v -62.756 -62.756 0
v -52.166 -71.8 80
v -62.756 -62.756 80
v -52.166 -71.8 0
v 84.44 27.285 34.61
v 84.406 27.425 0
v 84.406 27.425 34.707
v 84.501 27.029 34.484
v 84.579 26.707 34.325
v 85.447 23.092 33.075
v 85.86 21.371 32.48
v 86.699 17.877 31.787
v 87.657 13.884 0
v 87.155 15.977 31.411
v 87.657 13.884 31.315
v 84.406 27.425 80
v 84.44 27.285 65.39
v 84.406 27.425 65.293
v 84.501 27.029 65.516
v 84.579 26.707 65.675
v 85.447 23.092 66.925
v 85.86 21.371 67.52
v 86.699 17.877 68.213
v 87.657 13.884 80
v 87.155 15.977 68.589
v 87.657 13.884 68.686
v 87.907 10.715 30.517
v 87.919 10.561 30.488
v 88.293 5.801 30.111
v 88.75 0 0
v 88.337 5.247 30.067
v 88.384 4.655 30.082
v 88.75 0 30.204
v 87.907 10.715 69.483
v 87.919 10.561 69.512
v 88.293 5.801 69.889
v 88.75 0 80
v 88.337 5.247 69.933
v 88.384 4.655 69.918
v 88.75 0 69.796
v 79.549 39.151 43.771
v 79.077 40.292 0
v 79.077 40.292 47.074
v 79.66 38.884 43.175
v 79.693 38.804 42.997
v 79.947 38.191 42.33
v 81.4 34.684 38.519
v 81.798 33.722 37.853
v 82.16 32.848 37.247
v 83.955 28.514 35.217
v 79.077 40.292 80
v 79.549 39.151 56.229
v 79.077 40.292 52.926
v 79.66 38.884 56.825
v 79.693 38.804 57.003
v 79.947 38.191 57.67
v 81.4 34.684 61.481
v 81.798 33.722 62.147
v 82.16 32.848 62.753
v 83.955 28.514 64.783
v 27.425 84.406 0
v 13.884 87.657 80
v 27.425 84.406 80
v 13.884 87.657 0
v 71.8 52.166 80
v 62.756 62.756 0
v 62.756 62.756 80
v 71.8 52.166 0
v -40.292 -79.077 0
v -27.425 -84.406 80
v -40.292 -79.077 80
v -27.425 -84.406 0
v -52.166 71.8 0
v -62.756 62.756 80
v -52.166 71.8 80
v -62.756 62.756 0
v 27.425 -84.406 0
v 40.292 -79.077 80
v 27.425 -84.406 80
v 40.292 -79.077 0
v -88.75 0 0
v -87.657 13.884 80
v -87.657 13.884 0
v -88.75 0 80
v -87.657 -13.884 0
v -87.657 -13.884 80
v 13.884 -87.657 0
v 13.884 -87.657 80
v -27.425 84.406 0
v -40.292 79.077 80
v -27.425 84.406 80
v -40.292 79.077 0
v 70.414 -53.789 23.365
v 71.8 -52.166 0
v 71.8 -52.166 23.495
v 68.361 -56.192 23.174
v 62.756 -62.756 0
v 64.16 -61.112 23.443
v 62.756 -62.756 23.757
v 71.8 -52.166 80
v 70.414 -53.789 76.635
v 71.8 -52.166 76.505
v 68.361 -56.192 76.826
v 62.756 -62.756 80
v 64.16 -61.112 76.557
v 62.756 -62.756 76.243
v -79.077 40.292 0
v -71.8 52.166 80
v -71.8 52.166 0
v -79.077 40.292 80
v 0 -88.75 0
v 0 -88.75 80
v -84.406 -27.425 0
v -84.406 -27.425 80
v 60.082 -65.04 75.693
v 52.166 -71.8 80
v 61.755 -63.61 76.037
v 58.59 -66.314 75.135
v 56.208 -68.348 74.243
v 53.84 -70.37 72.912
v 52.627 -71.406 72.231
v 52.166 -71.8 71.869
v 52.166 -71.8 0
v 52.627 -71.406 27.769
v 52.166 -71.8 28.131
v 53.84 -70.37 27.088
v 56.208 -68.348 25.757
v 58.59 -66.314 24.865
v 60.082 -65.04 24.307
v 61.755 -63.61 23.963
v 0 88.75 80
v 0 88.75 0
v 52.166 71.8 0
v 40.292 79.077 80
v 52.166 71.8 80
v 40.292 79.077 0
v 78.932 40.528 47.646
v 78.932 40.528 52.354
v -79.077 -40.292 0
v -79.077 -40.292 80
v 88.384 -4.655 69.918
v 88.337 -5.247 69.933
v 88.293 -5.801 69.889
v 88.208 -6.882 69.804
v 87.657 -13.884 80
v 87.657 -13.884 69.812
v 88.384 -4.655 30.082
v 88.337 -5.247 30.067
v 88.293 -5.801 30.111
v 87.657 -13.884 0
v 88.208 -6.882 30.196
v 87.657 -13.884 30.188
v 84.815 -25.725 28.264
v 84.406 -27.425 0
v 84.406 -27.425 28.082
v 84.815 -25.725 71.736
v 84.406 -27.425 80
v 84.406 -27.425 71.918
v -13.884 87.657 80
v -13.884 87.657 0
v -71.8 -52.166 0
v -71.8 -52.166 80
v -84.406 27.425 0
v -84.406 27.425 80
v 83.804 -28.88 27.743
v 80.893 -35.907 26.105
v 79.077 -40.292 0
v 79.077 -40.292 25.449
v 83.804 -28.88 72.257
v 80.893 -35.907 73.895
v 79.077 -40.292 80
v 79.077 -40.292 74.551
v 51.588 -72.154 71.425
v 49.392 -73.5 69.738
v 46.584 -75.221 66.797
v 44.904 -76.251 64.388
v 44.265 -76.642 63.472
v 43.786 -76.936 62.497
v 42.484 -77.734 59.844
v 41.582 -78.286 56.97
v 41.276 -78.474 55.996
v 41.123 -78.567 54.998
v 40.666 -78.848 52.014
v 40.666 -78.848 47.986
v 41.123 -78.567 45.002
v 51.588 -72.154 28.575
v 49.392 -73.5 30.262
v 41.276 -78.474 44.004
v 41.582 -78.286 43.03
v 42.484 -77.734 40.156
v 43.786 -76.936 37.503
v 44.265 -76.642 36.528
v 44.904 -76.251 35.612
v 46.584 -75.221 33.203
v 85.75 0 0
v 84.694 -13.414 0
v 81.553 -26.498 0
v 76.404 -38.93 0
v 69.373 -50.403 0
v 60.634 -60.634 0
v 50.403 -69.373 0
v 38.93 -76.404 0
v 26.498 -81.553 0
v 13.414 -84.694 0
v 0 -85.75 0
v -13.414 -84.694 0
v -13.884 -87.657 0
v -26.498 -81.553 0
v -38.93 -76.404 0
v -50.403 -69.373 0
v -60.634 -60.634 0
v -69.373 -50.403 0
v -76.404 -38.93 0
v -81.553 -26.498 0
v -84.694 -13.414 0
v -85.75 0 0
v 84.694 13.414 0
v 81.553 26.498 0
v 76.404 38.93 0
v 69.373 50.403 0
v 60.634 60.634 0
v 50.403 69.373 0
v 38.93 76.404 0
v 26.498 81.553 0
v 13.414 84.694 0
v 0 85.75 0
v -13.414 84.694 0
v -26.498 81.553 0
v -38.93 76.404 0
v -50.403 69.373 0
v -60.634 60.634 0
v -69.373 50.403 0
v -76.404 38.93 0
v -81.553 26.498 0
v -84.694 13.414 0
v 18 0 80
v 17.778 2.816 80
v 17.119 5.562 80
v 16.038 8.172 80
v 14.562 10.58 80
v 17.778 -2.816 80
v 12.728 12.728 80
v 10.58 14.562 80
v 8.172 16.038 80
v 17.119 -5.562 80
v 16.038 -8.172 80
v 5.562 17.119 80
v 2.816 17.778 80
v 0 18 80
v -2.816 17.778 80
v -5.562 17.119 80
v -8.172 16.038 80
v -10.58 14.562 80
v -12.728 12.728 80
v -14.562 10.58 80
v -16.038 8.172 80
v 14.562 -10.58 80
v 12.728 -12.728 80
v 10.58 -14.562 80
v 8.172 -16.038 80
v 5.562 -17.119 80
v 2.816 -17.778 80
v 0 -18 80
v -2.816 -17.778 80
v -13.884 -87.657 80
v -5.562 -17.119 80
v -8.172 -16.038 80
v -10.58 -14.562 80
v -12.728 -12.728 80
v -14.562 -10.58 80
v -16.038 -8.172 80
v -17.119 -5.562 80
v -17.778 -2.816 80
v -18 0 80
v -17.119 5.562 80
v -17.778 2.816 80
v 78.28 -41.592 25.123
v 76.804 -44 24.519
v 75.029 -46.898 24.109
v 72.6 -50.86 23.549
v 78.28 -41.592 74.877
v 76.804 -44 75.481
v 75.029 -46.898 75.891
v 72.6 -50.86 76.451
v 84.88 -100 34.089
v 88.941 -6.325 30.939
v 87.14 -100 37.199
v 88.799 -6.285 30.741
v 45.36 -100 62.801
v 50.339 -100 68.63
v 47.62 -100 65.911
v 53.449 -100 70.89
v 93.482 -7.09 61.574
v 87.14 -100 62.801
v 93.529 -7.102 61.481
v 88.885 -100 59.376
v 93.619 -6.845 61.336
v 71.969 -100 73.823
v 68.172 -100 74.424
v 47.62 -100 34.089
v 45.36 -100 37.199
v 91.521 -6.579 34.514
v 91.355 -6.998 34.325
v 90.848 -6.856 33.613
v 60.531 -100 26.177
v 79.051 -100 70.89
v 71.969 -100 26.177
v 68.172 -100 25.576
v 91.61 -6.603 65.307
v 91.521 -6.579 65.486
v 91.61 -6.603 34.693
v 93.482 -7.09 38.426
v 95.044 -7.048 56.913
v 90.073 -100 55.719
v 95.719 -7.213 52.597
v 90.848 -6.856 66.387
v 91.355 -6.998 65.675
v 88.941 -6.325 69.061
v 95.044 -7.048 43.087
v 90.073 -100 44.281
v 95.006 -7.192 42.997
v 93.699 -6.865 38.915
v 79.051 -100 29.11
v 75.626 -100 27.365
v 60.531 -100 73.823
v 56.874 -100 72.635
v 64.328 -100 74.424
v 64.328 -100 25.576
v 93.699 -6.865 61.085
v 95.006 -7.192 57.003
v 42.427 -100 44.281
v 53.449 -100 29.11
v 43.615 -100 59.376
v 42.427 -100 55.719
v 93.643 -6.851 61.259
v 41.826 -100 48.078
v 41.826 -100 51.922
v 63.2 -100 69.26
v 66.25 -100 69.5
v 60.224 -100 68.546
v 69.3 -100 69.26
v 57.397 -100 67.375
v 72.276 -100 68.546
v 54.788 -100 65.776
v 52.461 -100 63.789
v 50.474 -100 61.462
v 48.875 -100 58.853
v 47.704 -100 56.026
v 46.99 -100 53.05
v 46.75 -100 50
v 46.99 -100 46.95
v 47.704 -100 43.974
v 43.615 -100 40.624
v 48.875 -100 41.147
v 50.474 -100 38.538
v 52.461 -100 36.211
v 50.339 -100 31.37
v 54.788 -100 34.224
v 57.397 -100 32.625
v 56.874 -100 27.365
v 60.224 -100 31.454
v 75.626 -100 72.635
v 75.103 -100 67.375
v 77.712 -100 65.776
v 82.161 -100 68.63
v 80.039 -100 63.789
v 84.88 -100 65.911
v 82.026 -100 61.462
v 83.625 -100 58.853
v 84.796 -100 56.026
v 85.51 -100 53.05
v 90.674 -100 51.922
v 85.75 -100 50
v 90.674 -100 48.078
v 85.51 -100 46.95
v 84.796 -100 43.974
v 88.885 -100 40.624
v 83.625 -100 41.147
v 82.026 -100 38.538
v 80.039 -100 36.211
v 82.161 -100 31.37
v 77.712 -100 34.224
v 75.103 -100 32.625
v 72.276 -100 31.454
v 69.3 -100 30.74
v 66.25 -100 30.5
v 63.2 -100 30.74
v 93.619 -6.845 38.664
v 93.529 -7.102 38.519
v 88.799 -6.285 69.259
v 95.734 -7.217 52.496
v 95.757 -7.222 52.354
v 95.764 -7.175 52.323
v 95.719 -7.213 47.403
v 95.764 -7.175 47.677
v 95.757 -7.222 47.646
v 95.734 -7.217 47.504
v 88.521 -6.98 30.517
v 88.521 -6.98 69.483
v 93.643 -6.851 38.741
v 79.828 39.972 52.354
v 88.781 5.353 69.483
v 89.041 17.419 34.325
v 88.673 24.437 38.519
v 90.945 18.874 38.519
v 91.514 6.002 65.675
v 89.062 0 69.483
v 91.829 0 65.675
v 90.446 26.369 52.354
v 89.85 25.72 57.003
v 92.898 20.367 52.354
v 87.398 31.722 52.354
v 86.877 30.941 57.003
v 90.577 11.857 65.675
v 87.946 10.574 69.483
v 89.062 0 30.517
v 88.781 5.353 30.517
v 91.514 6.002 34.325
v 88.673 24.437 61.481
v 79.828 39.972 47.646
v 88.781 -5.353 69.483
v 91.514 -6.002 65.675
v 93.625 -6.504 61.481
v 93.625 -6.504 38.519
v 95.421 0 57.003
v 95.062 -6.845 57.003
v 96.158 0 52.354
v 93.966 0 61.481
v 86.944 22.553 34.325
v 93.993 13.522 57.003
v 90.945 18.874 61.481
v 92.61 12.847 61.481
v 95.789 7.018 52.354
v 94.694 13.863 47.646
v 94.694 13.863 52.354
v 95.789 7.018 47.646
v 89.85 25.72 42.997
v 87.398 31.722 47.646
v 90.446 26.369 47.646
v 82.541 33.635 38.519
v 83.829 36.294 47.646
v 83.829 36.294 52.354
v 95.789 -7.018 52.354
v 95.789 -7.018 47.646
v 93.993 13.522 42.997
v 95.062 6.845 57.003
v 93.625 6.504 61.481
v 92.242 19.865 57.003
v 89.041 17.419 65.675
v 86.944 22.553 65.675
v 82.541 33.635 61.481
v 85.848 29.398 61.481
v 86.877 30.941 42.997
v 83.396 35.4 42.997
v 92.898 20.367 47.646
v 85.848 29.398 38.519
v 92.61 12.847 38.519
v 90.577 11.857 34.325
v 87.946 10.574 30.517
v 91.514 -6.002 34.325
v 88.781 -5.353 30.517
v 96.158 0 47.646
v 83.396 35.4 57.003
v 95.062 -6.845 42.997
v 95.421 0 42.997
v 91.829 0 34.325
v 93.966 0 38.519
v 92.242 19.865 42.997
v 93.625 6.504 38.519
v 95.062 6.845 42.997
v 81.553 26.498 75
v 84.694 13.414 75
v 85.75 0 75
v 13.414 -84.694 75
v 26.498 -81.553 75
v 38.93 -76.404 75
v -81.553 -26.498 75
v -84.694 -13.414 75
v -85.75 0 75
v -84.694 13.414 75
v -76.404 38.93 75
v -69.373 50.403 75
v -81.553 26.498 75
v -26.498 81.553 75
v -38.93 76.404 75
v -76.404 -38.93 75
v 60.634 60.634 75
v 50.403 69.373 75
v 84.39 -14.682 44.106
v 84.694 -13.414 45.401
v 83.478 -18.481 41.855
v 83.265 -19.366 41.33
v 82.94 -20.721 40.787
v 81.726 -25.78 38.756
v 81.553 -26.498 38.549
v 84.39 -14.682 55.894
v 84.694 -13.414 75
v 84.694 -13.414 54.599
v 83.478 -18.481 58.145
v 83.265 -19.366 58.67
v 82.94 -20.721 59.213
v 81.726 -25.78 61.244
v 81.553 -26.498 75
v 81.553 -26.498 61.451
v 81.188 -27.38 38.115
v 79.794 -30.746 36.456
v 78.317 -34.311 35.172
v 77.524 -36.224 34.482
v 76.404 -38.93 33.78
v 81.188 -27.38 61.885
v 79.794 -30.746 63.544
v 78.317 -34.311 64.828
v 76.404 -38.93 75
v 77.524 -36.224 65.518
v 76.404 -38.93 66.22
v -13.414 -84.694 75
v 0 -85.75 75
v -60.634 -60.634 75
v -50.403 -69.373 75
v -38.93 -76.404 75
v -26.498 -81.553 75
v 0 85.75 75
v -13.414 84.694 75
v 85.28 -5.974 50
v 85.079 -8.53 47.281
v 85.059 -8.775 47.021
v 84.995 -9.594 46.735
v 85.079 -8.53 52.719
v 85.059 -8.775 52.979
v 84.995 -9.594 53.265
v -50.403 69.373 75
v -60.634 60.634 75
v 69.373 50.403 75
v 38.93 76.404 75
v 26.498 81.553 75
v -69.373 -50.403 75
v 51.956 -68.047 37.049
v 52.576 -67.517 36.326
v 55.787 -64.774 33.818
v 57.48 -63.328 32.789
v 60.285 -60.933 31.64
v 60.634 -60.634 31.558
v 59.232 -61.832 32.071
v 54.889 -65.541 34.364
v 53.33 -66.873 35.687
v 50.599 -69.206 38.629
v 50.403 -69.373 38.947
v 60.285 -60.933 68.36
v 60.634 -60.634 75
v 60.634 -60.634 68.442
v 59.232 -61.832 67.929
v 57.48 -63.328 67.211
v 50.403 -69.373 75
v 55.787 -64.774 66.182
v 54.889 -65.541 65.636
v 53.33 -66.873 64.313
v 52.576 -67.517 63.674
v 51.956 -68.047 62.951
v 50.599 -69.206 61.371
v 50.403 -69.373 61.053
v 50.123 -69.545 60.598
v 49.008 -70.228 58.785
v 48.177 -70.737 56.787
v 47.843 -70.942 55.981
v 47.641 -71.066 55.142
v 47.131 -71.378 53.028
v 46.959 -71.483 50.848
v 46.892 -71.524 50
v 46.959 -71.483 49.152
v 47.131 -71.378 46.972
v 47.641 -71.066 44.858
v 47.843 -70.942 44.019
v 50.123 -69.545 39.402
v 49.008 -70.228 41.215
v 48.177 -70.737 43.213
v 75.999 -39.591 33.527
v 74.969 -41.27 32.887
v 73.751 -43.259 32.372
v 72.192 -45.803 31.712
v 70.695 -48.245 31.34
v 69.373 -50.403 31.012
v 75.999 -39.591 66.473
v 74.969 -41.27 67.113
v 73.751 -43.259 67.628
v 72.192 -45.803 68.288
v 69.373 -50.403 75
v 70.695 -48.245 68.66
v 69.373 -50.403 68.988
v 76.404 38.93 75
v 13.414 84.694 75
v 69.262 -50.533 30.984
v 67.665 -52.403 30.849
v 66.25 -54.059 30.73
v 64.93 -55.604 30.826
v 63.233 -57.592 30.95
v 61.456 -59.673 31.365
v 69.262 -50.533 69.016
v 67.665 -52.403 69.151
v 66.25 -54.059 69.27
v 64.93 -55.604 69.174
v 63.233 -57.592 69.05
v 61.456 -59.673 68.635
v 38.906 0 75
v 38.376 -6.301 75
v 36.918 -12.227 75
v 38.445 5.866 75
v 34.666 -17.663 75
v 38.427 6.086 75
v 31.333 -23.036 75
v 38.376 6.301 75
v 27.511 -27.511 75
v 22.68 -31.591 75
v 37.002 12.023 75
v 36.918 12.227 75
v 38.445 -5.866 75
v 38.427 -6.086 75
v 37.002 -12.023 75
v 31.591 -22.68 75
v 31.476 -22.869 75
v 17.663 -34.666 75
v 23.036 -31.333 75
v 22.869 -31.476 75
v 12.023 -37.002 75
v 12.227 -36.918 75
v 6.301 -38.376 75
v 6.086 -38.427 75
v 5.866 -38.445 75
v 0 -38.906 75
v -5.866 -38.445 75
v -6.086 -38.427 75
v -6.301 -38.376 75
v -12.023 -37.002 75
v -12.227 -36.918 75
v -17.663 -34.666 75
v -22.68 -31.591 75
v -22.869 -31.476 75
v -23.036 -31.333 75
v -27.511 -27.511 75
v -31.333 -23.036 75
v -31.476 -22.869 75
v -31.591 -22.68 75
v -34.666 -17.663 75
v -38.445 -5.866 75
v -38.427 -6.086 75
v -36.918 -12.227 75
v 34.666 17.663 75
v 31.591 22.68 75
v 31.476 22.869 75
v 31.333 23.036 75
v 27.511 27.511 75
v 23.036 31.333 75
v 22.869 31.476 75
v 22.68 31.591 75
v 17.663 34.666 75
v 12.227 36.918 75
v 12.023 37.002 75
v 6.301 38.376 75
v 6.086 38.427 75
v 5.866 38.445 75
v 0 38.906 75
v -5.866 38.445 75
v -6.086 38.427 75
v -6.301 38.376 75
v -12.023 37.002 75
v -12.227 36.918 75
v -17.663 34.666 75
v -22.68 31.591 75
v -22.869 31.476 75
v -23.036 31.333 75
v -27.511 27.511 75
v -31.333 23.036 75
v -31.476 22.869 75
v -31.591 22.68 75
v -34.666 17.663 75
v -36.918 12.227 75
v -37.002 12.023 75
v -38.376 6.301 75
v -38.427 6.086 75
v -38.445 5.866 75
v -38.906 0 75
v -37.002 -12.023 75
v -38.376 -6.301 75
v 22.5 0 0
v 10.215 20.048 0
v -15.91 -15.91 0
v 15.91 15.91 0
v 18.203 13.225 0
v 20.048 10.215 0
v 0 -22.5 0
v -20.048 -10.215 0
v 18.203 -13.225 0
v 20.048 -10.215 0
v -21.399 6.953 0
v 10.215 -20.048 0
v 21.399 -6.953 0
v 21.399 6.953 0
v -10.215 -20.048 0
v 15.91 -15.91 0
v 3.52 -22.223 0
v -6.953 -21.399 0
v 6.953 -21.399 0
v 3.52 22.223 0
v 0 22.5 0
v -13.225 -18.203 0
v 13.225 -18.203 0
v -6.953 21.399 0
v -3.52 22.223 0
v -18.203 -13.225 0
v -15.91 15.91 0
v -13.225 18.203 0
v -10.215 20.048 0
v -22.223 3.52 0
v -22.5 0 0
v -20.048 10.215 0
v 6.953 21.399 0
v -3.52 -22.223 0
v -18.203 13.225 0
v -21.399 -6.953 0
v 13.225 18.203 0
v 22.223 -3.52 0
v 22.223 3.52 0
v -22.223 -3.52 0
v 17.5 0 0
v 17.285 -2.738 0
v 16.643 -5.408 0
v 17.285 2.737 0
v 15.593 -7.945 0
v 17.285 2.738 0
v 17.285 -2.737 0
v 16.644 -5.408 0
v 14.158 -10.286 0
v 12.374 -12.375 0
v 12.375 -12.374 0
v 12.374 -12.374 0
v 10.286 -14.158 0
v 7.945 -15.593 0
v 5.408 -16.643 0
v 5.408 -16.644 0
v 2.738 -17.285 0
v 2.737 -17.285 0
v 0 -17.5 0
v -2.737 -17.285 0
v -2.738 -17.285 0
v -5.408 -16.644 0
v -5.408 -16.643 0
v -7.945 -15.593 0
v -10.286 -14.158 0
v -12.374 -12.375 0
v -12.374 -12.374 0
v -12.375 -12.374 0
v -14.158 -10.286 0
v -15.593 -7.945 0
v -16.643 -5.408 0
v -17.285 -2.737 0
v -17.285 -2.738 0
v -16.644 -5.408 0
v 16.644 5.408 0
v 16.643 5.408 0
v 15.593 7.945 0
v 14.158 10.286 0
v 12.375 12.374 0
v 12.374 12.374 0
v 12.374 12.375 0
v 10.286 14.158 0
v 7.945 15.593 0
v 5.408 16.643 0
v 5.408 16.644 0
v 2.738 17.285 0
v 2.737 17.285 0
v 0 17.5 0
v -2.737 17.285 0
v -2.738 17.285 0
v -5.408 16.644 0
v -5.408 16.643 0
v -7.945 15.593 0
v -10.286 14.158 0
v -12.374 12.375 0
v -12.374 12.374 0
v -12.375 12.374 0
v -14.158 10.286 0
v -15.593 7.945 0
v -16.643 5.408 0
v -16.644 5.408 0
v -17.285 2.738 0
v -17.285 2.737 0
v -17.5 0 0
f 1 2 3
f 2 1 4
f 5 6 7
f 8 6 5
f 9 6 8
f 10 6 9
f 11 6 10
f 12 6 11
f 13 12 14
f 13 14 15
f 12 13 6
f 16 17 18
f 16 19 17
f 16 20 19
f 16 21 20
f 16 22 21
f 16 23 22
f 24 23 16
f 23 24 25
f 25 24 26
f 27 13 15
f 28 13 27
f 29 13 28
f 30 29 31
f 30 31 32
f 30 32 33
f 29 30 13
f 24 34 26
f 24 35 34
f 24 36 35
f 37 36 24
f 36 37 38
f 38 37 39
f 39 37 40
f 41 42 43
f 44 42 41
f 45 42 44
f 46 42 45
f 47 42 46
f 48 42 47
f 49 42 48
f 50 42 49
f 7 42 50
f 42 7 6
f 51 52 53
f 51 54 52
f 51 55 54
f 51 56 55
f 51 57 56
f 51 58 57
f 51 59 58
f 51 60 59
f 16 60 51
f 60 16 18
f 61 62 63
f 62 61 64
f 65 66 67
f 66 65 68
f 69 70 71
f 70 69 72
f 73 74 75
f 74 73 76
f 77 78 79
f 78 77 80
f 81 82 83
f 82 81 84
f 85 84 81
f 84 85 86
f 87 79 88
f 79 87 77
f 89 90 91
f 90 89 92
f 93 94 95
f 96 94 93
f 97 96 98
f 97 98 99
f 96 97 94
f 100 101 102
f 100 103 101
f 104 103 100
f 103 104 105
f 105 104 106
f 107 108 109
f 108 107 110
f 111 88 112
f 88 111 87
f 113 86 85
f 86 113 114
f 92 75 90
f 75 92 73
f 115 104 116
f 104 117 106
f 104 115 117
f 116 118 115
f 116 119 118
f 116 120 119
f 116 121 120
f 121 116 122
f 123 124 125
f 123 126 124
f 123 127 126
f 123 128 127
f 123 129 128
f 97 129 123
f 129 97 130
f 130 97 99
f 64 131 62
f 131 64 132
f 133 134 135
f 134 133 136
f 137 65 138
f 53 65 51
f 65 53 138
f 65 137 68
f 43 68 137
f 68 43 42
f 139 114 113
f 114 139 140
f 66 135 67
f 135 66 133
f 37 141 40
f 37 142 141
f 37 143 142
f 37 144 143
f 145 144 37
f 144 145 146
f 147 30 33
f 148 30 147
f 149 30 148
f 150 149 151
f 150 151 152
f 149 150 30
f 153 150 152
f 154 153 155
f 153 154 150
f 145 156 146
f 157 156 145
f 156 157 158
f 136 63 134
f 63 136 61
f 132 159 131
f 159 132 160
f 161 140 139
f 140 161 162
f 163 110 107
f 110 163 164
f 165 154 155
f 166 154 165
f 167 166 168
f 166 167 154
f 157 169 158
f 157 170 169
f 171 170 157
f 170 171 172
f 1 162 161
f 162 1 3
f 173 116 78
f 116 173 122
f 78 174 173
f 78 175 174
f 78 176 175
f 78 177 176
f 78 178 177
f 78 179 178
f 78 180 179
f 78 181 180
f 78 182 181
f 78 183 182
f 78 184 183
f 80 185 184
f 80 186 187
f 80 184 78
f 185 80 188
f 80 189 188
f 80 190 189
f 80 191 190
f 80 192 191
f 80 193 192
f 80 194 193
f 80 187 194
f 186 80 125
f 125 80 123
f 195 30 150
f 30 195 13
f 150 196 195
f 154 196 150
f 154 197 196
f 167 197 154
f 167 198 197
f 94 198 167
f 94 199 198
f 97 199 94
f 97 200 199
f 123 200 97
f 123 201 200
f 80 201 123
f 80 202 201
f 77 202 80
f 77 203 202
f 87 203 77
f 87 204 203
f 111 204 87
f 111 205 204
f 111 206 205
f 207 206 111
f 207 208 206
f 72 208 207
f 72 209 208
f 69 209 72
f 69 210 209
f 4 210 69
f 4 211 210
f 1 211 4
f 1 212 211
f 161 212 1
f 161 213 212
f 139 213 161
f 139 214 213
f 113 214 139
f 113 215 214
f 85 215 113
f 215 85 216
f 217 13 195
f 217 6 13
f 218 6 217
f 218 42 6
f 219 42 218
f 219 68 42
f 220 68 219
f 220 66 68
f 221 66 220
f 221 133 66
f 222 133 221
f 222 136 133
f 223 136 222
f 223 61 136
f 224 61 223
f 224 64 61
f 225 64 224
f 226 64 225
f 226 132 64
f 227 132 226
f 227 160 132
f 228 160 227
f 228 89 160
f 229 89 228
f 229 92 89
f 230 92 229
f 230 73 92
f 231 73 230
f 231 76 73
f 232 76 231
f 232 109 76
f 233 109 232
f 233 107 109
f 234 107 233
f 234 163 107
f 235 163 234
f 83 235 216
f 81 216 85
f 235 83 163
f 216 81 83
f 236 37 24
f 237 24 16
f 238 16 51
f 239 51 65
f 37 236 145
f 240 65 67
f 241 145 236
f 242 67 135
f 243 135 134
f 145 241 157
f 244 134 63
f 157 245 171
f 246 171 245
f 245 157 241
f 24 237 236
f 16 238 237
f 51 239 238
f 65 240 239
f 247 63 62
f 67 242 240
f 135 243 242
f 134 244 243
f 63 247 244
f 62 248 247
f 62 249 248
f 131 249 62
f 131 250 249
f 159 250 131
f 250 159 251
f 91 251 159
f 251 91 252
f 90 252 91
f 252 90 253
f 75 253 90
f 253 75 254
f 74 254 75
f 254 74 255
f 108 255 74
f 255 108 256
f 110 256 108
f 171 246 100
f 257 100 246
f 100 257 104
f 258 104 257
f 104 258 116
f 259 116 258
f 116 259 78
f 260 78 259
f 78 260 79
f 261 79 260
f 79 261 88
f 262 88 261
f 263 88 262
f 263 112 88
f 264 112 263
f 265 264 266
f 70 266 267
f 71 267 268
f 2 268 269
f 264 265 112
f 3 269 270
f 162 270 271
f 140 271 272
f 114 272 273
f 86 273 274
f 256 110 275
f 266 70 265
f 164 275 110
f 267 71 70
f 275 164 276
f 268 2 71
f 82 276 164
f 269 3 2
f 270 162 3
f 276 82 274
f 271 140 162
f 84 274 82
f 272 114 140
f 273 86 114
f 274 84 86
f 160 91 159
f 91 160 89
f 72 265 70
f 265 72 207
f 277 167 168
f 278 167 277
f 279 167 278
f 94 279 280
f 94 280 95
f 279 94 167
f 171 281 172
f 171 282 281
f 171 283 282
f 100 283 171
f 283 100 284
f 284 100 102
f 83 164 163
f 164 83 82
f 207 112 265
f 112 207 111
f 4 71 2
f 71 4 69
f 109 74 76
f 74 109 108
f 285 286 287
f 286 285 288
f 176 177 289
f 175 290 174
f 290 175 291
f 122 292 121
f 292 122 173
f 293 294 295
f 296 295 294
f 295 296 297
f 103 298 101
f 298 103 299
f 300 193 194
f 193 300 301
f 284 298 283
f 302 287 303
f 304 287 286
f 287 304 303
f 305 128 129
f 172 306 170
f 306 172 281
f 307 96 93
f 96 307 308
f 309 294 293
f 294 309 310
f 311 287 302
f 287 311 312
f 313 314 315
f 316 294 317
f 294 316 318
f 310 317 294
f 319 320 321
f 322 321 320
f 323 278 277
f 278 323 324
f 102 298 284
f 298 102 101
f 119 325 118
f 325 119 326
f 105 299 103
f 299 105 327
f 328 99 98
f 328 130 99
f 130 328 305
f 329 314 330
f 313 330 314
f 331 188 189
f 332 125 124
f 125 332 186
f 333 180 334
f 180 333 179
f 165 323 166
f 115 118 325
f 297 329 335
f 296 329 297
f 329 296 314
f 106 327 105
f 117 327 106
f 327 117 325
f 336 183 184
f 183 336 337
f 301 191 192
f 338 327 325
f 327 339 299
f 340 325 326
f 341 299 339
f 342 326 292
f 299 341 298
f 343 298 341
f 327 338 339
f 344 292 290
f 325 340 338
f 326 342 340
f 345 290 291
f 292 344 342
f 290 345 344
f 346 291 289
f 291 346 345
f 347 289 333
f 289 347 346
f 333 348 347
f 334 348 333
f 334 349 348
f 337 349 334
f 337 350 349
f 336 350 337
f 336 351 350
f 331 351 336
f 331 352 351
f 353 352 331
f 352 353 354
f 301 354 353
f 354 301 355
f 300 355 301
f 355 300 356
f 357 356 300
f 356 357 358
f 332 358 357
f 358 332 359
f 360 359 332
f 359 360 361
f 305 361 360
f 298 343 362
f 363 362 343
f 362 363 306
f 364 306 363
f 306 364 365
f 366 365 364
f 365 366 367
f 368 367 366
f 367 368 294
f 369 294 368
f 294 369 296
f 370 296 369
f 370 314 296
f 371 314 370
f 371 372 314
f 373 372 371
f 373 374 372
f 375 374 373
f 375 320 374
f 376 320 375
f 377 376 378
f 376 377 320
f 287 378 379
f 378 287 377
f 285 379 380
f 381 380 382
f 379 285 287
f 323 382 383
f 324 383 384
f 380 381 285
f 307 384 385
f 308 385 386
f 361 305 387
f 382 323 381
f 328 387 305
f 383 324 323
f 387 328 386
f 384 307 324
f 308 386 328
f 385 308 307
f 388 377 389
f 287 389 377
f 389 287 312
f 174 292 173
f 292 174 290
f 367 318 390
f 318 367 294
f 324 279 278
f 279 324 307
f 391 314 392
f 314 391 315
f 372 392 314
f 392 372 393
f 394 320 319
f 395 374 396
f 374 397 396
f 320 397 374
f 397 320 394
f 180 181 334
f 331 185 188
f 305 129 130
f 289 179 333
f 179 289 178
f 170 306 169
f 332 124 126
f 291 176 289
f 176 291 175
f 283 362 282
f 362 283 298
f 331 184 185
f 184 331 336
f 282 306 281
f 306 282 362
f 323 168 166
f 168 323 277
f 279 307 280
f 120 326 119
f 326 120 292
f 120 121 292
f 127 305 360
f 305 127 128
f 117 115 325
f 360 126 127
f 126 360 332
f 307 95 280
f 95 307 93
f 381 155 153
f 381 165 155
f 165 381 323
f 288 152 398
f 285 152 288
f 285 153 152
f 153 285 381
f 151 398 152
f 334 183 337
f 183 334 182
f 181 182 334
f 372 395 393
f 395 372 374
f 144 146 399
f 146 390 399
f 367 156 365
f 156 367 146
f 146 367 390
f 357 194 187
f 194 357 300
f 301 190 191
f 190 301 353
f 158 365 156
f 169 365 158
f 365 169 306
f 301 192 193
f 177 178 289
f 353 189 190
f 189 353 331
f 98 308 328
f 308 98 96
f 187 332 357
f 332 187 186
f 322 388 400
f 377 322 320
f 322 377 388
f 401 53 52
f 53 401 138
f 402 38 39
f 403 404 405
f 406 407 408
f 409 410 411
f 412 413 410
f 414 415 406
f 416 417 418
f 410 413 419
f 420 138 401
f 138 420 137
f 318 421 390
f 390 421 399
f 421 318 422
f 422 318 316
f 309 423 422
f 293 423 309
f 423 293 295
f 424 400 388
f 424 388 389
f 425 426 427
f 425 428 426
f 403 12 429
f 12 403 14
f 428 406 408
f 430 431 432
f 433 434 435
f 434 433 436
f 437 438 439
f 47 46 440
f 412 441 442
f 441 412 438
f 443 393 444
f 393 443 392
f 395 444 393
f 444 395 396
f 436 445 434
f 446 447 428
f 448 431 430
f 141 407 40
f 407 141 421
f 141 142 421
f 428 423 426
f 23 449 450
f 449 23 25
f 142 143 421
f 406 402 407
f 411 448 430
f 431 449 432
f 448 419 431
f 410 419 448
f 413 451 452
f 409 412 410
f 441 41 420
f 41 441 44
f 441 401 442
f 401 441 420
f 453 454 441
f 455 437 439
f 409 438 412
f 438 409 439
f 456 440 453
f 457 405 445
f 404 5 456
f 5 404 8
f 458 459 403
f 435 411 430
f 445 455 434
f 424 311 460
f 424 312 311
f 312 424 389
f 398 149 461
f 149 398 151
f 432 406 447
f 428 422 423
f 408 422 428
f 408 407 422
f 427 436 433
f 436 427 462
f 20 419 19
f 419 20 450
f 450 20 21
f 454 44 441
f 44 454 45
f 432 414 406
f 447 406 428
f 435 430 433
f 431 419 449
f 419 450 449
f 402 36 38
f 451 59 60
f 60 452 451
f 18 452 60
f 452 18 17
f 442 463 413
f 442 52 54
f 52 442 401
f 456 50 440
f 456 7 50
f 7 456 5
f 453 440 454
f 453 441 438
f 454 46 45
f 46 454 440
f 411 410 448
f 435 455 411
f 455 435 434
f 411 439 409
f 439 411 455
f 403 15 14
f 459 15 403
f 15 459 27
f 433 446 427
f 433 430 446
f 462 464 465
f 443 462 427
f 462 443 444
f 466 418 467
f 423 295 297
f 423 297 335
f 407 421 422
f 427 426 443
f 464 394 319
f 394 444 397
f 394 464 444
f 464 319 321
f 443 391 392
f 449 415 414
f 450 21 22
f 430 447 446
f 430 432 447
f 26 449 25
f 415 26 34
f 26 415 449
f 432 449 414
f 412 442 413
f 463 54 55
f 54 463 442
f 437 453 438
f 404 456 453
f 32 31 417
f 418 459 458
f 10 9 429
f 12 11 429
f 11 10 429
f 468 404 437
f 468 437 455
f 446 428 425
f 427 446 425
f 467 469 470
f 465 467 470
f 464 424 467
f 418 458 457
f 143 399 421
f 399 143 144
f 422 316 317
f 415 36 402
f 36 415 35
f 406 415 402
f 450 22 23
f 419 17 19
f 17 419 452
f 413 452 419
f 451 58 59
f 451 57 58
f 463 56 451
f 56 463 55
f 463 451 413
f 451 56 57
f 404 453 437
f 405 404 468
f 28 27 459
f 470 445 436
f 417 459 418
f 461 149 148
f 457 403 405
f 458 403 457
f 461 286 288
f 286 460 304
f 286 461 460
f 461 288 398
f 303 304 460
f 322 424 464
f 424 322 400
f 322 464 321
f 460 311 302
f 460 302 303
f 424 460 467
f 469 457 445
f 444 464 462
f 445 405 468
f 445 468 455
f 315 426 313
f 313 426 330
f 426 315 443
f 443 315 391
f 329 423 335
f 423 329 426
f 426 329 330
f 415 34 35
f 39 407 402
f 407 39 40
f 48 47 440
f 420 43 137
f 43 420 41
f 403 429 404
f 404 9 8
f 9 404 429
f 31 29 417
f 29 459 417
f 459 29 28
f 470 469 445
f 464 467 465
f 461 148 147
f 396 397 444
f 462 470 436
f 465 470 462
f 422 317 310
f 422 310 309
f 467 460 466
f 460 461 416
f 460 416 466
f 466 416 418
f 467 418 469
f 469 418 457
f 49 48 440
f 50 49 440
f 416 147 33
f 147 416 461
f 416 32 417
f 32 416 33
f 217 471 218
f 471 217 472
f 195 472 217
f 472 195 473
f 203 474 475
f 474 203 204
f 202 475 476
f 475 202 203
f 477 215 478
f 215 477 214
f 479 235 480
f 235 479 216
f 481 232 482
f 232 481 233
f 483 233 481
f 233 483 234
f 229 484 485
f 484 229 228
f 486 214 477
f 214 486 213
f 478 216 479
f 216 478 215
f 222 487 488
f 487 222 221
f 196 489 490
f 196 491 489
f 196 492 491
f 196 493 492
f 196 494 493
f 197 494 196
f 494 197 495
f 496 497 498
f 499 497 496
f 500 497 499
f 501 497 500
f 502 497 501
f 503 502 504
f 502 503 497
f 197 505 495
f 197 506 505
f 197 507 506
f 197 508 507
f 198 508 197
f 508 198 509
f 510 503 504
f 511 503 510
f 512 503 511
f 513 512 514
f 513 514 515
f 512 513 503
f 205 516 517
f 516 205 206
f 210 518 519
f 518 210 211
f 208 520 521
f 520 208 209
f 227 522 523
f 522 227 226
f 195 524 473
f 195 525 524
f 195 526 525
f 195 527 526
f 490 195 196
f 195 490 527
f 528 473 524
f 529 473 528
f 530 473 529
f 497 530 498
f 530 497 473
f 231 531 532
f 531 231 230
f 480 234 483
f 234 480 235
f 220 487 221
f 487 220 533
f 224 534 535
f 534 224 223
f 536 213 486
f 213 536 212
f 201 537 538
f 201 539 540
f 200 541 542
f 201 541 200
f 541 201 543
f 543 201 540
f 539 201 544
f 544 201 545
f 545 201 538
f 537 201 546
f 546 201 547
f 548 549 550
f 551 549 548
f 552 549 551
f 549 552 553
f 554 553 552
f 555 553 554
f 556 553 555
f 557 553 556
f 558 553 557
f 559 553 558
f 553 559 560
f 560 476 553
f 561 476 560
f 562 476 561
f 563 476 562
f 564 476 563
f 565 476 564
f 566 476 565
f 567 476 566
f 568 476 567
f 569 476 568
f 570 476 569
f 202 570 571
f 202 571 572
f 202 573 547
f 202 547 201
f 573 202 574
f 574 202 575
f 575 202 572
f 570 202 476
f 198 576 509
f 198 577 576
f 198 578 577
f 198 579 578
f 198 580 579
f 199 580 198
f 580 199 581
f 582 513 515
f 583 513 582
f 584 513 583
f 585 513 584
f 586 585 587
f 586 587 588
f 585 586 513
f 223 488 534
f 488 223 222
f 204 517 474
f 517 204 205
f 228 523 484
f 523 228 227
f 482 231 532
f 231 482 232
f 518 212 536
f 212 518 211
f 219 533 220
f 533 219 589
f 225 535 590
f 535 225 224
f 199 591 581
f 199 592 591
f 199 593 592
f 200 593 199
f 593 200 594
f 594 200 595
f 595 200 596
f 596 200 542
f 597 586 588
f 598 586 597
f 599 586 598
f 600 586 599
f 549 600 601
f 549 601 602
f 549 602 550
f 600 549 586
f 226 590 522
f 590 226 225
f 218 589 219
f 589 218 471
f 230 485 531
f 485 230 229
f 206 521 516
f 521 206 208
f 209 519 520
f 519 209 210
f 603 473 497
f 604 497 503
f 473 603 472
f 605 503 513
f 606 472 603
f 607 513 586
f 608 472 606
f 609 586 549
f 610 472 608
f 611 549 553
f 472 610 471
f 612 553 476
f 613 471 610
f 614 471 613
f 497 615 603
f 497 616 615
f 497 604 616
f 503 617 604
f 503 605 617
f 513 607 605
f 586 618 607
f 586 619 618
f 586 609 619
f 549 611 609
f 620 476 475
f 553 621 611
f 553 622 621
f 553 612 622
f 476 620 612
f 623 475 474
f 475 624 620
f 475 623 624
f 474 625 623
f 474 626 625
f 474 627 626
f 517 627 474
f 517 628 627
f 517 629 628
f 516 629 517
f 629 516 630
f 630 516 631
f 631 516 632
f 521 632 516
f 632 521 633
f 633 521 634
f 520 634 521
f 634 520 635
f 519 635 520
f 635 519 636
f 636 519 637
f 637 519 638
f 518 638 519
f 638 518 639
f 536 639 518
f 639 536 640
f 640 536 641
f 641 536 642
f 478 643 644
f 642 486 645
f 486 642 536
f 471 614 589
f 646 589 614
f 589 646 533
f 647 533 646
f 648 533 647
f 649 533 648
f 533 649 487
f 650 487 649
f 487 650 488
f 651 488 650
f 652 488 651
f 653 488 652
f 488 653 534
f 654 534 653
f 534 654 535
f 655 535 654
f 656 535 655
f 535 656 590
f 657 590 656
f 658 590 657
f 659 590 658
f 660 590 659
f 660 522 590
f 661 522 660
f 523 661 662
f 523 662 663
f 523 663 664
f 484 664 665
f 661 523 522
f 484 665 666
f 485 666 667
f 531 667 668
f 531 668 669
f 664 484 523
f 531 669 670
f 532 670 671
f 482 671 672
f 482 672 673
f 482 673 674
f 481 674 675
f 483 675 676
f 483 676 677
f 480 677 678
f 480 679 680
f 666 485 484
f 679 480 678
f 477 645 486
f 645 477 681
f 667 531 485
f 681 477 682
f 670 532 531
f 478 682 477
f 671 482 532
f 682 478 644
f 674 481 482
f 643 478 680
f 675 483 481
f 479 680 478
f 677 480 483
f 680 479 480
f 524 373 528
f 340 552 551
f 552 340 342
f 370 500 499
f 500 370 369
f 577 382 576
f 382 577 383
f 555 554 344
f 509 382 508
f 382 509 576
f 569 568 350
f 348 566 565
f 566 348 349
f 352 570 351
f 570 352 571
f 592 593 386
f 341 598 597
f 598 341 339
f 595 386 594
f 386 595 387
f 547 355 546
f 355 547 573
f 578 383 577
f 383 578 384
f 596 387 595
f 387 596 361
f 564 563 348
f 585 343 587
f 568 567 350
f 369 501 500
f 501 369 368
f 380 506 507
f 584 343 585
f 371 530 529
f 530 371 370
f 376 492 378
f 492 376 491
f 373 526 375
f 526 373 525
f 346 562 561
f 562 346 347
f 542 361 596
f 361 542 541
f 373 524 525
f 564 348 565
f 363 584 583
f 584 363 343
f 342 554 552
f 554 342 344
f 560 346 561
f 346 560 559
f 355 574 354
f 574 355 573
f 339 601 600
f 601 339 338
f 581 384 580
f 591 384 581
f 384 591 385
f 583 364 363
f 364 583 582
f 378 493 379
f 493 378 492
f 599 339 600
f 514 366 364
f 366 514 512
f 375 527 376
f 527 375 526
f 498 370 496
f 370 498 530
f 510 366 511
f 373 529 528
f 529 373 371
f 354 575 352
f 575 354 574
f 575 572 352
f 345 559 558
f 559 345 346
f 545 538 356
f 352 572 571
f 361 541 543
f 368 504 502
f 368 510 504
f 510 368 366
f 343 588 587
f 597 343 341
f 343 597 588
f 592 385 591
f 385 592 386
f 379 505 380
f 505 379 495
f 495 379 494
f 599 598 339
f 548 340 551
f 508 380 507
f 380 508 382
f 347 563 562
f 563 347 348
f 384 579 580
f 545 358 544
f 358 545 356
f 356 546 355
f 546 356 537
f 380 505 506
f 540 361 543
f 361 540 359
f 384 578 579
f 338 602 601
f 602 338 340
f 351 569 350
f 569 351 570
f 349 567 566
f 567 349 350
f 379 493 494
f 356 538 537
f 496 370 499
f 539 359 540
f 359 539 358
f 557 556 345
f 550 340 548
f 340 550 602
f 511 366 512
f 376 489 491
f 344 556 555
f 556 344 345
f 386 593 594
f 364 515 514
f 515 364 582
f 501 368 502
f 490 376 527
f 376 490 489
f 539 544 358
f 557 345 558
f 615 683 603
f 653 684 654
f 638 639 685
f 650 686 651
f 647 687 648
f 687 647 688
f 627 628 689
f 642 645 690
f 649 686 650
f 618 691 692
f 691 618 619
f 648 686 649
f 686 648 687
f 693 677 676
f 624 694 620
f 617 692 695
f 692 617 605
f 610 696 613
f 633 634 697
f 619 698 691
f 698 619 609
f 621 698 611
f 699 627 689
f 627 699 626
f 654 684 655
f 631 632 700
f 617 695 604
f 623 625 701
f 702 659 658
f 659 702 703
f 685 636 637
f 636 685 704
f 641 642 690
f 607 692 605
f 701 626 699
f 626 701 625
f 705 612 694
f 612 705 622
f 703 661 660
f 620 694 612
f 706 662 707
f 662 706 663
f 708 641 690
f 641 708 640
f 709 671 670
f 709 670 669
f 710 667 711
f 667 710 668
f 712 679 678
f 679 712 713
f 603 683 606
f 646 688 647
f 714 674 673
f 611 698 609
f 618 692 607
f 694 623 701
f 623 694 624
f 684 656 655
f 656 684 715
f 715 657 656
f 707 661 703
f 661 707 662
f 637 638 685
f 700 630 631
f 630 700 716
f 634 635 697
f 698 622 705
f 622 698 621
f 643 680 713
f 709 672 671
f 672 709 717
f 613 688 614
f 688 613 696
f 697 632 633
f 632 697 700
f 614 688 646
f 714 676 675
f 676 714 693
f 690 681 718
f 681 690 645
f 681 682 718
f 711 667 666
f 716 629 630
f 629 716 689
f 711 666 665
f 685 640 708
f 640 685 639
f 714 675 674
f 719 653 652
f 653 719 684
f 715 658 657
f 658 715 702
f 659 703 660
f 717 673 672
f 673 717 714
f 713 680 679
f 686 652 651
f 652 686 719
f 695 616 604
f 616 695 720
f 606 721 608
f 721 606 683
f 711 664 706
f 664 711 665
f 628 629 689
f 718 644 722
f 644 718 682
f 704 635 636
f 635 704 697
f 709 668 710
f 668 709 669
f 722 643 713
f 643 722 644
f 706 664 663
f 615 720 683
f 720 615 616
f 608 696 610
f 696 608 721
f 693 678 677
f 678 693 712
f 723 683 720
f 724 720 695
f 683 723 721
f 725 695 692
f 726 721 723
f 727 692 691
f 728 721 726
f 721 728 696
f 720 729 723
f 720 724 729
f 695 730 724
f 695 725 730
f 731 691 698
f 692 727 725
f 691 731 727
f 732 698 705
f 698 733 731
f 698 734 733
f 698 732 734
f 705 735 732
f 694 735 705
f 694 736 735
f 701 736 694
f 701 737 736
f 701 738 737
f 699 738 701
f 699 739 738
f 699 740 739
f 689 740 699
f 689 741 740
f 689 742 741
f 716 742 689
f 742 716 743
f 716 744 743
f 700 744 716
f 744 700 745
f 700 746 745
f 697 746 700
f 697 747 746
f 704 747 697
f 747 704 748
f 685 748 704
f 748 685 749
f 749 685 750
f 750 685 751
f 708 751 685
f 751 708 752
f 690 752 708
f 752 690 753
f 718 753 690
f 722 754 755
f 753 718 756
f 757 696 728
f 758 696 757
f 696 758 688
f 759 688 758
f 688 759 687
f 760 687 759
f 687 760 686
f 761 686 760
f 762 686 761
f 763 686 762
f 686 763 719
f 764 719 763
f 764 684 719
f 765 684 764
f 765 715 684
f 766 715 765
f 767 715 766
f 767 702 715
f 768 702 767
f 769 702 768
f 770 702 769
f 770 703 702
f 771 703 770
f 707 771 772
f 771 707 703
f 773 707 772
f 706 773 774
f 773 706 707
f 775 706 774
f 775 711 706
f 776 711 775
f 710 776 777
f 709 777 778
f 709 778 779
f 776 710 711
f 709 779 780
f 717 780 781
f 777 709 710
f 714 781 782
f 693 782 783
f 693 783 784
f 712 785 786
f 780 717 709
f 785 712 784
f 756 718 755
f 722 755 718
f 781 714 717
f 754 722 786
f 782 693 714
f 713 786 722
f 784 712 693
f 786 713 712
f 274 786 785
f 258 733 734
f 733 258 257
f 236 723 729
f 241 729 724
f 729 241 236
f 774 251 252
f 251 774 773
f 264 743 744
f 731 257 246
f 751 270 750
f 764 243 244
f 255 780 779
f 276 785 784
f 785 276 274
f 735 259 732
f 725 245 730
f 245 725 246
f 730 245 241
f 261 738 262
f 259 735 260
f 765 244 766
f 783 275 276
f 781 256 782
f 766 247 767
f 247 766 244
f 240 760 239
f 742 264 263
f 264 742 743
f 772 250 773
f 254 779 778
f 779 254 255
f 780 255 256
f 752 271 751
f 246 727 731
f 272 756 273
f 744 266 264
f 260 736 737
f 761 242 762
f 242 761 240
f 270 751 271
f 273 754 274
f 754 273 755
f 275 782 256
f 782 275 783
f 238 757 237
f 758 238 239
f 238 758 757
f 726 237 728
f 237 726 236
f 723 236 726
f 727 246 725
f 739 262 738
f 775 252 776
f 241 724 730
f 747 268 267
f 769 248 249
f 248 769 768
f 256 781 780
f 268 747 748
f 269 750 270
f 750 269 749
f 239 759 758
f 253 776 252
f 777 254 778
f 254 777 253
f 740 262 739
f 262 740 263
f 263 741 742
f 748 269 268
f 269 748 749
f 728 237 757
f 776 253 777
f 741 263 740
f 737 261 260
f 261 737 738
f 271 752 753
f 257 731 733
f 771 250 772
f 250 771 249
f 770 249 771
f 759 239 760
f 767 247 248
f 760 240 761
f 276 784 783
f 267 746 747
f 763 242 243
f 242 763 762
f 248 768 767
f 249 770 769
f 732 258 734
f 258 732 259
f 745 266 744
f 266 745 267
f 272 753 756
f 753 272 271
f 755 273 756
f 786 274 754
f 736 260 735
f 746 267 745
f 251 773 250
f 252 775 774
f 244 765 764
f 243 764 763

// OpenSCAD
res = 40;

intake_d_ext = 60; //external diameter of intake pipe at base
intake_sh = 5;	// thickness of wall of intake pipe
intake_d_int = 39; // intake entrance internal diameter
intake_d_int_diff = 1; // intake internal diameter shrink
intake_l = 100; // Length of the intake pipe

outlet_d_ext = 80; //external diameter of intake pipe at base
outlet_sh = 5;	// thickness of wall of intake pipe
outlet_d_int = 35; // intake entrance internal diameter
outlet_d_int_diff = -1; // intake internal diameter shrink
outlet_l = 80; // Length of the intake pipe

top_d = 177.5;
top_t = 5;
top_h = 80;
shell = 3;


module cover(){
	difference(){
		union(){
			translate([0,0,top_h])rotate(a=[180,0,0])outlet_pipe_pos();
			difference(){
				union(){
					cylinder(r=top_d/2,h=top_h,$fn=res);
					translate([top_d/2-intake_d_int/2-shell,0,top_h-intake_d_ext/2])rotate(a=[90,360/res/2,0])intake_pipe_pos();
					translate([top_d/2-intake_d_int/2-shell,0,top_h-intake_d_ext/2])scale([1,1.5,1])sphere(r=intake_d_ext/2,$fn=res);
		
				}
				union(){
					cylinder(r=top_d/2-shell,h=top_h-top_t,$fn=res);
					translate([top_d/2-intake_d_int/2-shell,0,top_h-intake_d_ext/2])rotate(a=[90,0,0])intake_pipe_neg();
				}
			}
		}
		translate([0,0,top_h+0.005])rotate(a=[180,0,0])outlet_pipe_neg();
	}
}

module intake_pipe_pos(){
	cylinder(r1=intake_d_ext/2,r2=intake_d_int/2+intake_sh,h=intake_l,$fn=res);
}

module intake_pipe_neg(){
	cylinder(r1=(intake_d_int-intake_d_int_diff)/2,r2=intake_d_int/2,h=intake_l,$fn=res);
}

module outlet_pipe_pos(){
	cylinder(r1=outlet_d_ext/2,r2=outlet_d_int/2+outlet_sh,h=outlet_l,$fn=res);
}

module outlet_pipe_neg(){
	cylinder(r1=(outlet_d_int-outlet_d_int_diff)/2,r2=outlet_d_int/2,h=outlet_l+0.01,$fn=res);
}


/*
difference(){
	union(){
		cylinder(r1=60/2,r2=44/2,h=50,$fn=res);
		import("CycloneCap.stl");
	}
	cylinder(r1=35/2,r2=36/2,h=50,$fn=res);
}*/

cover();
//intake_pipe();
